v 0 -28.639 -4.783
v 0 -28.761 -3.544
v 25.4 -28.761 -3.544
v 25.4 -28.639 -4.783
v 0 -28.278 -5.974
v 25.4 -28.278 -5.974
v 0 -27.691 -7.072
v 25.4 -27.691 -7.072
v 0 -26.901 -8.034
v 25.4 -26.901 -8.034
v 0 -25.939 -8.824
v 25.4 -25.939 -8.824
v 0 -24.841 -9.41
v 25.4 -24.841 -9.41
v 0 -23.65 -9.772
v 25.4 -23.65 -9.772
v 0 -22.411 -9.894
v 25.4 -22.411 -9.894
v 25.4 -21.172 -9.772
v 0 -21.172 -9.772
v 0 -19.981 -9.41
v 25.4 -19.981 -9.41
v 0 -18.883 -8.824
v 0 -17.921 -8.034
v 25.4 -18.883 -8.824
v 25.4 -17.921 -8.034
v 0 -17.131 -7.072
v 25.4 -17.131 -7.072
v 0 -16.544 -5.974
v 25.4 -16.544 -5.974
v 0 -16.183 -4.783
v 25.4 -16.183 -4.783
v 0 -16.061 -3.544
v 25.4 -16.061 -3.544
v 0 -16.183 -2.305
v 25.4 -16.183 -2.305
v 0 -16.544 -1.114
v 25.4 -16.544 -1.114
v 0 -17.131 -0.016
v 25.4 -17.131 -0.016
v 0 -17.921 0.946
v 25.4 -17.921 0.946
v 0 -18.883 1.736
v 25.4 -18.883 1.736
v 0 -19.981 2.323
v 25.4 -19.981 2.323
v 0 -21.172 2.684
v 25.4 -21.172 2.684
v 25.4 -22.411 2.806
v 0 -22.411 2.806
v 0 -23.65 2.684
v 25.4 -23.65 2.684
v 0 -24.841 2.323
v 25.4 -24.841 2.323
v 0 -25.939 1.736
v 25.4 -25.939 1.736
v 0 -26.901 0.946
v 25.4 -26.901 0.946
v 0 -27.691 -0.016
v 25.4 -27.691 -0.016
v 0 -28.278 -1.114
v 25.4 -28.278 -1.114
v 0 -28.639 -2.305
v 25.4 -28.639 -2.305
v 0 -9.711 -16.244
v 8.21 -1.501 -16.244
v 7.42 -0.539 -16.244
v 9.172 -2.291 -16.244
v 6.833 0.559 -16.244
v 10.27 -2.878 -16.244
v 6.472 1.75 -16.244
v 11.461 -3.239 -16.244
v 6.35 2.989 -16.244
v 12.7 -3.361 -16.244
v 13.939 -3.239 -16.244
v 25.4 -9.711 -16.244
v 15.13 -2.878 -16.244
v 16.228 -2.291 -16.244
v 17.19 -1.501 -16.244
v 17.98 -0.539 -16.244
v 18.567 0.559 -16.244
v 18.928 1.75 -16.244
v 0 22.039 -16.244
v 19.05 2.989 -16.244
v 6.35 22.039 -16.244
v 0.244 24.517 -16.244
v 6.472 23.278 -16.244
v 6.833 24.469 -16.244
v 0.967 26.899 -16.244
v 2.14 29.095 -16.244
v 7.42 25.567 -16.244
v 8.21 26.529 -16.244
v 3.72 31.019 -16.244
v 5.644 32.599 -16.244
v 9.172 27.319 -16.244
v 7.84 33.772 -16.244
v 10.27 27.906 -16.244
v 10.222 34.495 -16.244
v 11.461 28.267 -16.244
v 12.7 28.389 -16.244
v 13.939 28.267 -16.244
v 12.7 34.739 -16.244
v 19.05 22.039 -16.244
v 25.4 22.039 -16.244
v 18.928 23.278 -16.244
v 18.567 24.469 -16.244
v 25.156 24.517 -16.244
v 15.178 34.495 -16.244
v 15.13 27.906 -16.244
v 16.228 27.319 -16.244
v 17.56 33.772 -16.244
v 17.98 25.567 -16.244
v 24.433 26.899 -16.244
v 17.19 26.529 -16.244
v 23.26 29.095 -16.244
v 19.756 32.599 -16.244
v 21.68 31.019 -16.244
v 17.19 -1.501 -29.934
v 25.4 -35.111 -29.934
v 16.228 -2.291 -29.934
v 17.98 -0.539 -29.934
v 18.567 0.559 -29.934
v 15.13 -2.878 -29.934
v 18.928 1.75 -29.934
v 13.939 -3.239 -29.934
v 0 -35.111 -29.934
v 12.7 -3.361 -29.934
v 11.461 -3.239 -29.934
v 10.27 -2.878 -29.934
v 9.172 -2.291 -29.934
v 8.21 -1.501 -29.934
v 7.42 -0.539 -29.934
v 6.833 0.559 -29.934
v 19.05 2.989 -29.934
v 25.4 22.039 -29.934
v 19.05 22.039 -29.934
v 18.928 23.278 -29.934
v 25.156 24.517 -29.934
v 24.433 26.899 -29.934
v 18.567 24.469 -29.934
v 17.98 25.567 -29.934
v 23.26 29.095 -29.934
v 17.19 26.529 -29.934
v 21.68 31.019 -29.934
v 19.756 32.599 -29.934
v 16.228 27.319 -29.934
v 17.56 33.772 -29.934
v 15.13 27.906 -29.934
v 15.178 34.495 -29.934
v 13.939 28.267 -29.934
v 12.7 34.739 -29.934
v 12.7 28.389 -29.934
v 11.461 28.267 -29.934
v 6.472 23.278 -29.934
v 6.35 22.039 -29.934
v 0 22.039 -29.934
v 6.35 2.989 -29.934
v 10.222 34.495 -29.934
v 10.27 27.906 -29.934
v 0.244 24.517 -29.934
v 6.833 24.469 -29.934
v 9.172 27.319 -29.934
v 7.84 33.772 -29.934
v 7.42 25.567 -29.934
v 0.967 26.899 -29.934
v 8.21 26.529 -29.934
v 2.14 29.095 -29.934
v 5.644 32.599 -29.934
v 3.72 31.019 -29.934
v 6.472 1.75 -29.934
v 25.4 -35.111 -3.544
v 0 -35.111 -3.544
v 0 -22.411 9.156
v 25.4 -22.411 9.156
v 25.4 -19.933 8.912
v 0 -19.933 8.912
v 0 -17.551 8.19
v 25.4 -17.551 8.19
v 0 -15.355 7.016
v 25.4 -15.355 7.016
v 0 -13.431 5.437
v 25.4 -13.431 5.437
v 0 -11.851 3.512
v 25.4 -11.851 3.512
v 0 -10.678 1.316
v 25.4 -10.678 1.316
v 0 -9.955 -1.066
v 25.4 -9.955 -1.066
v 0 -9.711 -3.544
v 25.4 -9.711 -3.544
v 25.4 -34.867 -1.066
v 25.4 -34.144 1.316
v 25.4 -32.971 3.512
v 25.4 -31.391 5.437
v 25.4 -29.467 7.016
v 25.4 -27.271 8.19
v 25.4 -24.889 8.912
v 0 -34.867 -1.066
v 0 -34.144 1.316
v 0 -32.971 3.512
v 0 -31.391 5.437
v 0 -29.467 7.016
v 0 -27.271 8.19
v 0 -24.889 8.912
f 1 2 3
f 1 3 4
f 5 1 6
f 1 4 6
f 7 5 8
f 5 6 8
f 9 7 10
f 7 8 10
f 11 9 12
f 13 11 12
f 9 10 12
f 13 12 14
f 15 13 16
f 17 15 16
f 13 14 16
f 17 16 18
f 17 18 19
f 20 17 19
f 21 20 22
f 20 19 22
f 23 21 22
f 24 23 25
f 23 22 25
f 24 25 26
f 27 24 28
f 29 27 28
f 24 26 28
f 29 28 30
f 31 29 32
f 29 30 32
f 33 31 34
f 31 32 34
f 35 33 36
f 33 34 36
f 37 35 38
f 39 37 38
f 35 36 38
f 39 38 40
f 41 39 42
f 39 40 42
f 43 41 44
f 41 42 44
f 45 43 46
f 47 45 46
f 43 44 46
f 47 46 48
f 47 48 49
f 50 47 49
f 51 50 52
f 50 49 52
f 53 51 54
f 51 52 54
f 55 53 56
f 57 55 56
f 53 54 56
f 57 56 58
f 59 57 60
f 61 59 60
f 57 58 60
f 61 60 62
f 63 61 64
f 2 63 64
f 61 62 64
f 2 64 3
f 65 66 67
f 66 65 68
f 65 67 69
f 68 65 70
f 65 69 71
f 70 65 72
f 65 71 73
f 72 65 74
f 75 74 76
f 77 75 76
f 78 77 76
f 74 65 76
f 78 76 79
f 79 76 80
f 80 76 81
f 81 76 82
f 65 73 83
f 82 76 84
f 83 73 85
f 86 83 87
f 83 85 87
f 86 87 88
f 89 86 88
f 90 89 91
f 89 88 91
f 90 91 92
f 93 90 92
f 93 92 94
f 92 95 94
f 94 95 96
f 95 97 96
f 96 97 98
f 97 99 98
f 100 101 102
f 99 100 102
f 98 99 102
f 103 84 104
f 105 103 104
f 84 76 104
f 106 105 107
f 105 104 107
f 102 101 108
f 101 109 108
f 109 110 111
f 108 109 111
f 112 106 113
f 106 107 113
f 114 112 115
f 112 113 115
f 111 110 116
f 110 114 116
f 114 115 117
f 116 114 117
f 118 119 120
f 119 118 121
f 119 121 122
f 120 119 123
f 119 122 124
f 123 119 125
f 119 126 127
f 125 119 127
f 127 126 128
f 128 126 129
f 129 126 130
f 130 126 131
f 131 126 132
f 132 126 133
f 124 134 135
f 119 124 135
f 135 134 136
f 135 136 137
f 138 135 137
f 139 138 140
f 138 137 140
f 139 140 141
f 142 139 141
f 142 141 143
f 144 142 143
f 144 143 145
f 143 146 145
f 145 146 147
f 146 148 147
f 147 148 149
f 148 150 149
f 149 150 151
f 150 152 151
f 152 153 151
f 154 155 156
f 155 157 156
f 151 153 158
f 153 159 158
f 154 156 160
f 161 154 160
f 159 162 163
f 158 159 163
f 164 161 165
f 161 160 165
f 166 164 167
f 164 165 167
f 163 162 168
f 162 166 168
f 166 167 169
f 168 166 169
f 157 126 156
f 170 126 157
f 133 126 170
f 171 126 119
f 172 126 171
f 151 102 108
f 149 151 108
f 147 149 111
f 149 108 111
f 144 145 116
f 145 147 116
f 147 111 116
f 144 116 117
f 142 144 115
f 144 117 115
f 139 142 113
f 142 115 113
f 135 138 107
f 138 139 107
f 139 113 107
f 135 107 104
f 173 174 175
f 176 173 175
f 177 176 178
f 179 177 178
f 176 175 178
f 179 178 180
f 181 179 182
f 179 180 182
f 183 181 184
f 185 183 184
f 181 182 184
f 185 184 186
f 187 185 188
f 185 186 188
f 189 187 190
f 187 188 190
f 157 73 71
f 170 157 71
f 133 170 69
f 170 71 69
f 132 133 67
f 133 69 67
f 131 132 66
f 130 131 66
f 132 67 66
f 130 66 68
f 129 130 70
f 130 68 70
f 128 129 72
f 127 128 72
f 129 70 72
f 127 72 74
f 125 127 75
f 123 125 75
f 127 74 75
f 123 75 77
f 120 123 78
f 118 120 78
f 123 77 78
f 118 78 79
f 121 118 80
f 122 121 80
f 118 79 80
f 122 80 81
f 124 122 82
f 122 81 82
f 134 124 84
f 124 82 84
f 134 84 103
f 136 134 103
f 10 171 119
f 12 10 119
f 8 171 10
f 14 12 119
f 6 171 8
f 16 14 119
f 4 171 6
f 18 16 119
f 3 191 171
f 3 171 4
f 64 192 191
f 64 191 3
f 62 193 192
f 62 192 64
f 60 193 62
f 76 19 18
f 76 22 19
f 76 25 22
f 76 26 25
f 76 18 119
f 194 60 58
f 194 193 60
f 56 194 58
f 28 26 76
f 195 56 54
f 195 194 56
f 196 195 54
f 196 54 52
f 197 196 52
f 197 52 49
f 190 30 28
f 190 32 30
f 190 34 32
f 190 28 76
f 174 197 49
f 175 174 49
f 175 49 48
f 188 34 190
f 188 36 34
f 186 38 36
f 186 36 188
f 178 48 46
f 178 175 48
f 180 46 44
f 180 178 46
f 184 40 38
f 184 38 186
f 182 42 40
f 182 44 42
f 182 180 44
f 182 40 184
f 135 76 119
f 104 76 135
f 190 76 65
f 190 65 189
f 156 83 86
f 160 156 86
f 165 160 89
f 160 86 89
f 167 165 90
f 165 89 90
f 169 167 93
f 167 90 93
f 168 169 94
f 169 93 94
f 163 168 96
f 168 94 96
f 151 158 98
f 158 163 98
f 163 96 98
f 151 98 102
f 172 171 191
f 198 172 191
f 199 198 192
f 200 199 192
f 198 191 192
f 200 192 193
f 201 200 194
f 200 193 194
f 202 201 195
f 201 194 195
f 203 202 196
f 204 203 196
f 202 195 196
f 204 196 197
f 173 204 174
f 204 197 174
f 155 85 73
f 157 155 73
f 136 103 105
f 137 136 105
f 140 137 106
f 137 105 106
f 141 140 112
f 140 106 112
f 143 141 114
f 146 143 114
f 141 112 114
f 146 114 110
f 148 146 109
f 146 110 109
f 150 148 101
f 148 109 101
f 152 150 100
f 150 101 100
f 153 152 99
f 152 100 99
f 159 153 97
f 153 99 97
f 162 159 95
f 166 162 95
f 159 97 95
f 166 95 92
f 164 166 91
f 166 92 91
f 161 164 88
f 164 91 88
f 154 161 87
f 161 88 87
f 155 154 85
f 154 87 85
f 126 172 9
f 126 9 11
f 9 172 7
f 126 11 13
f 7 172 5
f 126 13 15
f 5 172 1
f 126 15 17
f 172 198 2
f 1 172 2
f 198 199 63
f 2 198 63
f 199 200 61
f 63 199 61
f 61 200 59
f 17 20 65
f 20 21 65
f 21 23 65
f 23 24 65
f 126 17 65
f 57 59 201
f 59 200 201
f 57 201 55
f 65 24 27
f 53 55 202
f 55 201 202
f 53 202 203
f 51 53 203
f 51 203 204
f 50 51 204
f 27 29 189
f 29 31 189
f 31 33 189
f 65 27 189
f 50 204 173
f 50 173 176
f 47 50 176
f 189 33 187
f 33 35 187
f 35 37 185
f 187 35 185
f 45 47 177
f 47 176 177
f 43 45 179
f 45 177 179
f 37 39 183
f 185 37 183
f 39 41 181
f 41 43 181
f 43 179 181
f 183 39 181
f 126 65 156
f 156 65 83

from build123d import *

# Parameters (mm, degrees)
F0_W     = 69.85
F0_H     = 39.0903693825
F1_DEPTH = 25.4
F2_W     = 44.45
F2_H     = 25.4
F3_DEPTH = 25.4
F5_DEPTH = 25.4
F7_DEPTH = 25.4


with BuildPart() as f1:
    # F0 (on Right) → F1 (new body)
    with BuildSketch(Plane.YZ):
        with Locations((-0.1859475348, -10.3888954036)):
            Rectangle(F0_W, F0_H)
    extrude(amount=F1_DEPTH)

    # F2 (on face) → F3 (cut)
    with BuildSketch(Plane.YZ.offset(25.4)):
        with Locations((12.5140524652, -3.5437107123)):
            Rectangle(F2_W, F2_H)
    extrude(amount=-F3_DEPTH, mode=Mode.SUBTRACT)

    # F4 (on face) → F5 (cut)
    with BuildSketch(Plane.YZ.offset(25.4)):
        with BuildLine():
            Line((-9.7109475348, 9.1562892877), (-22.4109475348, 9.1562892877))
            ThreePointArc((-22.4109475348, 9.1562892877), (-13.4306914137, 5.4365454087), (-9.7109475348, -3.5437107123))
            Line((-9.7109475348, -3.5437107123), (-9.7109475348, 9.1562892877))
        make_face()
        with BuildLine():
            Line((-22.4109475348, 9.1562892877), (-35.1109475348, 9.1562892877))
            Line((-35.1109475348, 9.1562892877), (-35.1109475348, -3.5437107123))
            ThreePointArc((-35.1109475348, -3.5437107123), (-31.3912036558, 5.4365454087), (-22.4109475348, 9.1562892877))
        make_face()
        with BuildLine():
            ThreePointArc((-16.0609475348, -3.5437107123), (-22.4109475348, 2.8062892877), (-28.7609475348, -3.5437107123))
            Line((-28.7609475348, -3.5437107123), (-16.0609475348, -3.5437107123))
        make_face()
        with BuildLine():
            Line((-16.0609475348, -3.5437107123), (-28.7609475348, -3.5437107123))
            ThreePointArc((-28.7609475348, -3.5437107123), (-22.4109475348, -9.8937107123), (-16.0609475348, -3.5437107123))
        make_face()
    extrude(amount=-F5_DEPTH, mode=Mode.SUBTRACT)

    # F6 (on face) → F7 (cut)
    with BuildSketch(Plane.XY.offset(-16.2437107123)):
        with BuildLine():
            Line((12.7, 34.7390524652), (0, 34.7390524652))
            Line((0, 34.7390524652), (0, 22.0390524652))
            ThreePointArc((0, 22.0390524652), (3.7197438789, 31.0193085863), (12.7, 34.7390524652))
        make_face()
        with BuildLine():
            Line((25.4, 34.7390524652), (12.7, 34.7390524652))
            ThreePointArc((12.7, 34.7390524652), (21.6802561211, 31.0193085863), (25.4, 22.0390524652))
            Line((25.4, 22.0390524652), (25.4, 34.7390524652))
        make_face()
        with BuildLine():
            ThreePointArc((19.05, 22.0390524652), (12.7, 28.3890524652), (6.35, 22.0390524652))
            Line((6.35, 22.0390524652), (19.05, 22.0390524652))
        make_face()
        Polygon((19.05, 22.0390524652), (6.35, 22.0390524652), (6.35, 11.0405298372), (6.35, 2.9890524652), (19.05, 2.9890524652), (19.05, 11.0405298372), align=None)
        with BuildLine():
            Line((19.05, 2.9890524652), (6.35, 2.9890524652))
            ThreePointArc((6.35, 2.9890524652), (12.7, -3.3609475348), (19.05, 2.9890524652))
        make_face()
    extrude(amount=-F7_DEPTH, mode=Mode.SUBTRACT)


solid = f1.part
